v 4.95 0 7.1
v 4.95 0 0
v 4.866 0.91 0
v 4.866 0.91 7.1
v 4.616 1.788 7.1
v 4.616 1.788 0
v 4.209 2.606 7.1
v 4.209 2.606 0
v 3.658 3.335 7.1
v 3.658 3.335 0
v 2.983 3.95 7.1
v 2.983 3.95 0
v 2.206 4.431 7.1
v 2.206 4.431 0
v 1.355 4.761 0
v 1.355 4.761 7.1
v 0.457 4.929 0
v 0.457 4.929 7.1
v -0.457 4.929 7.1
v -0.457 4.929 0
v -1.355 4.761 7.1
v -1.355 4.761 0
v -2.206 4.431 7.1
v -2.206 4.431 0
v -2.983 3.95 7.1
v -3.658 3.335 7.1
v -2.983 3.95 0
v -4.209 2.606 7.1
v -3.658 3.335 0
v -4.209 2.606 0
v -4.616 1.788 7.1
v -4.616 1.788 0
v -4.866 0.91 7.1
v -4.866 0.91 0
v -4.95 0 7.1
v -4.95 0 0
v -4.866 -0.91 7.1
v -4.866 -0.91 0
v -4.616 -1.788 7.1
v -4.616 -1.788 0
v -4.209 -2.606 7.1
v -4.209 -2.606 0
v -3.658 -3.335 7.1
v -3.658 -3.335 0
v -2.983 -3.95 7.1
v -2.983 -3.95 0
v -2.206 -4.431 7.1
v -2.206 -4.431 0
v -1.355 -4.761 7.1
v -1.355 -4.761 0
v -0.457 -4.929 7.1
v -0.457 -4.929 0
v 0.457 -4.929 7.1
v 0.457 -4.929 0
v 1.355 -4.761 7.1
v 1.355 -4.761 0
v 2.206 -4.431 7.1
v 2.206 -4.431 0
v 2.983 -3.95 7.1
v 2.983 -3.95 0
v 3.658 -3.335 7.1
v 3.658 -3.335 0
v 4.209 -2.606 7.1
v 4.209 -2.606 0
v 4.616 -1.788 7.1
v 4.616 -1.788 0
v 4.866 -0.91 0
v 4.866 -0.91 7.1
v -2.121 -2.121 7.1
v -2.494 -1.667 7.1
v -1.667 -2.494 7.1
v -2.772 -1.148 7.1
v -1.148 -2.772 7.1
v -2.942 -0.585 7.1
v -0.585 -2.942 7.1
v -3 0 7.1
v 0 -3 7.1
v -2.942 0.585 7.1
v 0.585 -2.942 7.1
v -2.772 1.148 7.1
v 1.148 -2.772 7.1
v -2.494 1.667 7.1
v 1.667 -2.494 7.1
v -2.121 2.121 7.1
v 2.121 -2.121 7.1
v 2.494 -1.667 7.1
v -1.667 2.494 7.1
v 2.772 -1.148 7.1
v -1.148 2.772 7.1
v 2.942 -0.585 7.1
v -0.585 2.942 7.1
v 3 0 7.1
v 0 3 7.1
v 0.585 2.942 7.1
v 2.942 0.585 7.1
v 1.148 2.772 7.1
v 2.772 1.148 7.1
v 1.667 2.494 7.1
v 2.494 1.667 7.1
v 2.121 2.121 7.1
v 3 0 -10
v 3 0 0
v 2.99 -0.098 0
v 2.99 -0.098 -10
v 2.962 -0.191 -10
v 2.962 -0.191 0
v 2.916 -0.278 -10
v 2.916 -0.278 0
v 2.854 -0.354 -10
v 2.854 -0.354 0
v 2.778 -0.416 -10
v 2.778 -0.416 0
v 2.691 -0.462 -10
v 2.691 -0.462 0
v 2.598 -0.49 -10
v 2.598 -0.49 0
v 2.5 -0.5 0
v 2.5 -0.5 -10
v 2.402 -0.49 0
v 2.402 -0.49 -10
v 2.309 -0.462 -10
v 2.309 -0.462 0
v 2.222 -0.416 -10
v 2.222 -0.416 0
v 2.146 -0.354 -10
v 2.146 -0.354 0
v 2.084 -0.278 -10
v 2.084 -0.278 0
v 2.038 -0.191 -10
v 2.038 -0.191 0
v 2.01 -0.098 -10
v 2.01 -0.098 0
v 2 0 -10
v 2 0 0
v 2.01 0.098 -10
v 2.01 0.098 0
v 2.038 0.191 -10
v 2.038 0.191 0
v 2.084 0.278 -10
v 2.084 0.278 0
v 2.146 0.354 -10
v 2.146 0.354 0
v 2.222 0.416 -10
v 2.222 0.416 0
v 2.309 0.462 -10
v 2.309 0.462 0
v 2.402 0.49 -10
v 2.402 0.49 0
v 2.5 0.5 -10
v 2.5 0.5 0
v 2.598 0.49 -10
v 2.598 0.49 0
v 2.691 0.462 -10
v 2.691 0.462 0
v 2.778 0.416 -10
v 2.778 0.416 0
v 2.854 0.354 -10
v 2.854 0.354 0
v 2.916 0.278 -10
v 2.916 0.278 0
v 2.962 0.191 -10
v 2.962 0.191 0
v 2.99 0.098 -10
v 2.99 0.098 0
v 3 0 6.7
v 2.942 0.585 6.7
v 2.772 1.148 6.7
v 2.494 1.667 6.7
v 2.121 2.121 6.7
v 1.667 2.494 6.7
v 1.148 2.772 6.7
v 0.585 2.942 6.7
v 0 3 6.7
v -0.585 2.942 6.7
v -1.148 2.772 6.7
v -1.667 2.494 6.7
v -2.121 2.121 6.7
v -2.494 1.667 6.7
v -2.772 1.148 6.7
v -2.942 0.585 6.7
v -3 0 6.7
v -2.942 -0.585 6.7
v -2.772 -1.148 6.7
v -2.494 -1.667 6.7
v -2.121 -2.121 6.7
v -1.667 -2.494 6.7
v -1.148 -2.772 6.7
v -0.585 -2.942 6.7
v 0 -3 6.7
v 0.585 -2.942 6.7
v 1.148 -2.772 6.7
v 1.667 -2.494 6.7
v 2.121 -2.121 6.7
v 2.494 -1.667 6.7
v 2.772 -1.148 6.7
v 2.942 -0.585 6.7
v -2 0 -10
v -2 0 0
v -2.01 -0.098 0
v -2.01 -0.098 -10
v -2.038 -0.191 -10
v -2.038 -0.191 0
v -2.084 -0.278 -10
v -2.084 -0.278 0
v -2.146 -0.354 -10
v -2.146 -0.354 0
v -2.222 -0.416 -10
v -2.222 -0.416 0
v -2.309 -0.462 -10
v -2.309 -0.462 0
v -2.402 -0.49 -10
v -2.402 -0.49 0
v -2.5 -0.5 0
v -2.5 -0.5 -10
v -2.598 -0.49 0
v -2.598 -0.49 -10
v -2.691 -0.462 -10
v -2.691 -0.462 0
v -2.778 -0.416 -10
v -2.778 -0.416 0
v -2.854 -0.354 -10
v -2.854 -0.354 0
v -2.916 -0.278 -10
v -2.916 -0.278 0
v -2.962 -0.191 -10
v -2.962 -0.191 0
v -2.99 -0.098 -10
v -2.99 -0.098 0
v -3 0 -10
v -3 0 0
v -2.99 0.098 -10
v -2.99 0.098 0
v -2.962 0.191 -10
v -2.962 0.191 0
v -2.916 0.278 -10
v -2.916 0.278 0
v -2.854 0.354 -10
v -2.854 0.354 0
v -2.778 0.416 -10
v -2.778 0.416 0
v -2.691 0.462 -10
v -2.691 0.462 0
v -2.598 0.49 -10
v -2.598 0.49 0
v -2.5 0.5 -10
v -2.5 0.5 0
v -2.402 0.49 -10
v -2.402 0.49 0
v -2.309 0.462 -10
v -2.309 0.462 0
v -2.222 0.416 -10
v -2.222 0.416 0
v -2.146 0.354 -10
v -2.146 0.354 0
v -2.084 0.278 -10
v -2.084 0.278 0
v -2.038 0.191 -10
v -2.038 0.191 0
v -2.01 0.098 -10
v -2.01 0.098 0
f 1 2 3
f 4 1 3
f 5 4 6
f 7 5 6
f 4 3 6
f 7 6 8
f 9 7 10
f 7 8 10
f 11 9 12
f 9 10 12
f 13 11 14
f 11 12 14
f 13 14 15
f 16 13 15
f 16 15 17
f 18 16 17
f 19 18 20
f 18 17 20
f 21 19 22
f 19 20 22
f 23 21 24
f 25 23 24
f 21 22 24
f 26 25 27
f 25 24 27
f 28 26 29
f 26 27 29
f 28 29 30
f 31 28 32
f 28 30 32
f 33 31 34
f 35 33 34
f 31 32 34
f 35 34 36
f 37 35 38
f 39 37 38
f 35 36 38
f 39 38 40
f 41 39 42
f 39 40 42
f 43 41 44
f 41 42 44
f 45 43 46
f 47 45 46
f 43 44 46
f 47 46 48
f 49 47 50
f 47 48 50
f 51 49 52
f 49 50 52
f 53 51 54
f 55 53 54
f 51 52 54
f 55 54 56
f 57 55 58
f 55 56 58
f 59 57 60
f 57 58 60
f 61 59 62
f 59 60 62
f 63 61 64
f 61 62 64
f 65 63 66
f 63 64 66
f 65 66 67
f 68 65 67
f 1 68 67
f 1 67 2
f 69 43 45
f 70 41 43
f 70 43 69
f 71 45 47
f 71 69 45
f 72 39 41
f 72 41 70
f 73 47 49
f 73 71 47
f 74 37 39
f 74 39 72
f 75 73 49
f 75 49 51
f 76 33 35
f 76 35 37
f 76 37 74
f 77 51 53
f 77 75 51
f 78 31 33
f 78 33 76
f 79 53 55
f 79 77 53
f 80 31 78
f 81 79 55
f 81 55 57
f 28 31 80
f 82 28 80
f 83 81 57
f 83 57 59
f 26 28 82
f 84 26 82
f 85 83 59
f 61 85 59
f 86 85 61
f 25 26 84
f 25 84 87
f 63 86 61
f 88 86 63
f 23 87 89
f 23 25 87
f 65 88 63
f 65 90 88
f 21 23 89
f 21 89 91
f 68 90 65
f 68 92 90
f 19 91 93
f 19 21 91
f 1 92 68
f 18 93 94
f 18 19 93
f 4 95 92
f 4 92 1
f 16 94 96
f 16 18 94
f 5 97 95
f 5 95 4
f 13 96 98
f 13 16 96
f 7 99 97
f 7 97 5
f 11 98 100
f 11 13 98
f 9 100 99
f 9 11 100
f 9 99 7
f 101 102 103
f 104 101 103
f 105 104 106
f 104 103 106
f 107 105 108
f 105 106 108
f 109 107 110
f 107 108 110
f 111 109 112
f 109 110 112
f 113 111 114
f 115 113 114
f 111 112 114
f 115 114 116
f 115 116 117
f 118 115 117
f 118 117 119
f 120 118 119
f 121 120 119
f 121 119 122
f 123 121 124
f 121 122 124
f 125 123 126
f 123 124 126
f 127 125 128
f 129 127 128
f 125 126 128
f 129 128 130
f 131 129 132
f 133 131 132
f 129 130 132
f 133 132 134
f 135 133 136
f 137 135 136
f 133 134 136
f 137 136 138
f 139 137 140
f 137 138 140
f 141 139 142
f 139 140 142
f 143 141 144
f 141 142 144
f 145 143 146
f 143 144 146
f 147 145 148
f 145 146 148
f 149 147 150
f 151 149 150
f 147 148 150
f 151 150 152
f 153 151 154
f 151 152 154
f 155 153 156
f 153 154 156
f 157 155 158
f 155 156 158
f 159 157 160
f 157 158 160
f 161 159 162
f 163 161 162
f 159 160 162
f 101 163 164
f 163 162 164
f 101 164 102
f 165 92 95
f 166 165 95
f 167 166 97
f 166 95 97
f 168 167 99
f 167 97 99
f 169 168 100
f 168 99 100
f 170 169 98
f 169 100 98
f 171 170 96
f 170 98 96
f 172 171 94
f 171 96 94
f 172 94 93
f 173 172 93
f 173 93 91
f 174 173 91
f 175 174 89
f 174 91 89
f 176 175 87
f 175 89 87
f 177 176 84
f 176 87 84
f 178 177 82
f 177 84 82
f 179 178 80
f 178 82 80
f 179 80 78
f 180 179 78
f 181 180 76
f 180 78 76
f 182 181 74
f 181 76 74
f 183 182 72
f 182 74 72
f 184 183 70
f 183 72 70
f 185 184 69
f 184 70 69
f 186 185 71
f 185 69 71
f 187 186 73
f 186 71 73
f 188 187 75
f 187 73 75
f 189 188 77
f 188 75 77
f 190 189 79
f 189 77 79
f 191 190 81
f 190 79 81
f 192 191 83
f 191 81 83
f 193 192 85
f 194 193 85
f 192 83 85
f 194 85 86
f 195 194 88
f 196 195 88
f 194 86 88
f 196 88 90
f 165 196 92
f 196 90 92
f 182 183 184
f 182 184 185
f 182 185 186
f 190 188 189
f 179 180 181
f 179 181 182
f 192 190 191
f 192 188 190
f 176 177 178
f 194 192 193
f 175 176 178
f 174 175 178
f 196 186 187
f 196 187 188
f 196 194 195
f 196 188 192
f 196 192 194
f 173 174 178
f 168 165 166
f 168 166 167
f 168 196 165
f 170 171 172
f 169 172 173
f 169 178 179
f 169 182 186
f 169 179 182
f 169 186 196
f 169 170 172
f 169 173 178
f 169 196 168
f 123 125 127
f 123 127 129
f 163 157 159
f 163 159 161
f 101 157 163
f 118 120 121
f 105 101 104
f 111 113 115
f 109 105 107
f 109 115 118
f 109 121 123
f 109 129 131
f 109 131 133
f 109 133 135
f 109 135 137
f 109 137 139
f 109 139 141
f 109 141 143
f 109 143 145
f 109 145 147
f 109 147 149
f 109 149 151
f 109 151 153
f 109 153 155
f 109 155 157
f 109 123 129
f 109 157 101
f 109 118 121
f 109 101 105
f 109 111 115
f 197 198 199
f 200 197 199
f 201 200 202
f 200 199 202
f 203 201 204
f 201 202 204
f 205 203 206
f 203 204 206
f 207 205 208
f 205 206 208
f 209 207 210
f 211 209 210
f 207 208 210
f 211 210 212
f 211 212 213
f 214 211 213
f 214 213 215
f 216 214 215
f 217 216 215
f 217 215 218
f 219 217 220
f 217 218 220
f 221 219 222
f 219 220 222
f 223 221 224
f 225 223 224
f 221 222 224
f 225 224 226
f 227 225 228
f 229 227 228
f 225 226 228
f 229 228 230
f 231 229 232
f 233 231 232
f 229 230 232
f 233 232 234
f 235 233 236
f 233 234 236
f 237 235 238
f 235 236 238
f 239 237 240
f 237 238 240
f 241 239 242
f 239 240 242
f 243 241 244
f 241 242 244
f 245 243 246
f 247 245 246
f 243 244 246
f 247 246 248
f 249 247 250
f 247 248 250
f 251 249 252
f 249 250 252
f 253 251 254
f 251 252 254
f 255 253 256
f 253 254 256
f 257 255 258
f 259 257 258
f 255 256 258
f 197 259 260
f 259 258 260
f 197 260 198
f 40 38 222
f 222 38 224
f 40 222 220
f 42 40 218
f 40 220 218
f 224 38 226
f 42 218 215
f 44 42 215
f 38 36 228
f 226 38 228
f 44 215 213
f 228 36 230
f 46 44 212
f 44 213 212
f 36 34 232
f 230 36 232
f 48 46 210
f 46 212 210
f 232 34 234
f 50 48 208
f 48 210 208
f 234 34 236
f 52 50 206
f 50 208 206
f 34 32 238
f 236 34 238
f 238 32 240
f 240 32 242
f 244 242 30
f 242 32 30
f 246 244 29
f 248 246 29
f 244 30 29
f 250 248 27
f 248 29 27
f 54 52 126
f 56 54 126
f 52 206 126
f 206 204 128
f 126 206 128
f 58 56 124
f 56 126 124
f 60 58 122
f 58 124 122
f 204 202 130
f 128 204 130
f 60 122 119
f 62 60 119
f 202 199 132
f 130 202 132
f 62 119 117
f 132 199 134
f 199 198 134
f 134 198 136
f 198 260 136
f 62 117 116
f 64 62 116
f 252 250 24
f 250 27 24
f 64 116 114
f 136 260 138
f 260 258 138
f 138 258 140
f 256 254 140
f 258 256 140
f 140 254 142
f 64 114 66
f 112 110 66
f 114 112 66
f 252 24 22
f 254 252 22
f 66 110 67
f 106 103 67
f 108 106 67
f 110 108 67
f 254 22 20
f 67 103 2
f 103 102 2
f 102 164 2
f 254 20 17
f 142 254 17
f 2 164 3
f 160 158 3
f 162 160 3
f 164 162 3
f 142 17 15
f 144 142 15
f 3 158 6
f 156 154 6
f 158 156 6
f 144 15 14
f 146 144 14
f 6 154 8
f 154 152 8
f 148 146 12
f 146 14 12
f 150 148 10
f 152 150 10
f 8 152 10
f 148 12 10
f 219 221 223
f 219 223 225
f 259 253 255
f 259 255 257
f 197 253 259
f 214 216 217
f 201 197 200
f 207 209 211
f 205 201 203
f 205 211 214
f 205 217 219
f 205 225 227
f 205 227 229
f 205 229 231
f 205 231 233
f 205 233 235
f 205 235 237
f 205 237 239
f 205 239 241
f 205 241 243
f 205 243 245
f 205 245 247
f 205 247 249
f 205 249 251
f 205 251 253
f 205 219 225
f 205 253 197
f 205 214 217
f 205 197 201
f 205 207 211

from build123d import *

# Parameters (mm, degrees)
SKETCH_R     = 4.95
PAD_DEPTH    = 7.1
SKETCH001_R  = 0.5
PAD001_DEPTH = 10
SKETCH002_R  = 3
POCKET_DEPTH = 0.4


with BuildPart() as part:
    # Sketch → Pad (new body)
    with BuildSketch(Plane.XY):
        Circle(SKETCH_R)
    extrude(amount=PAD_DEPTH)

    # Sketch001 → Pad001 (new body)
    with BuildSketch(Plane(origin=(0, 0, 0), x_dir=(1, 0, 0), z_dir=(0, 0, -1))):
        with Locations((2.5, 0)):
            Circle(SKETCH001_R)
        with Locations((-2.5, 0)):
            Circle(SKETCH001_R)
    extrude(amount=PAD001_DEPTH)

    # Sketch002 → Pocket (cut)
    with BuildSketch(Plane.XY.offset(7.1)):
        Circle(SKETCH002_R)
    extrude(amount=-POCKET_DEPTH, mode=Mode.SUBTRACT)


solid = part.part
